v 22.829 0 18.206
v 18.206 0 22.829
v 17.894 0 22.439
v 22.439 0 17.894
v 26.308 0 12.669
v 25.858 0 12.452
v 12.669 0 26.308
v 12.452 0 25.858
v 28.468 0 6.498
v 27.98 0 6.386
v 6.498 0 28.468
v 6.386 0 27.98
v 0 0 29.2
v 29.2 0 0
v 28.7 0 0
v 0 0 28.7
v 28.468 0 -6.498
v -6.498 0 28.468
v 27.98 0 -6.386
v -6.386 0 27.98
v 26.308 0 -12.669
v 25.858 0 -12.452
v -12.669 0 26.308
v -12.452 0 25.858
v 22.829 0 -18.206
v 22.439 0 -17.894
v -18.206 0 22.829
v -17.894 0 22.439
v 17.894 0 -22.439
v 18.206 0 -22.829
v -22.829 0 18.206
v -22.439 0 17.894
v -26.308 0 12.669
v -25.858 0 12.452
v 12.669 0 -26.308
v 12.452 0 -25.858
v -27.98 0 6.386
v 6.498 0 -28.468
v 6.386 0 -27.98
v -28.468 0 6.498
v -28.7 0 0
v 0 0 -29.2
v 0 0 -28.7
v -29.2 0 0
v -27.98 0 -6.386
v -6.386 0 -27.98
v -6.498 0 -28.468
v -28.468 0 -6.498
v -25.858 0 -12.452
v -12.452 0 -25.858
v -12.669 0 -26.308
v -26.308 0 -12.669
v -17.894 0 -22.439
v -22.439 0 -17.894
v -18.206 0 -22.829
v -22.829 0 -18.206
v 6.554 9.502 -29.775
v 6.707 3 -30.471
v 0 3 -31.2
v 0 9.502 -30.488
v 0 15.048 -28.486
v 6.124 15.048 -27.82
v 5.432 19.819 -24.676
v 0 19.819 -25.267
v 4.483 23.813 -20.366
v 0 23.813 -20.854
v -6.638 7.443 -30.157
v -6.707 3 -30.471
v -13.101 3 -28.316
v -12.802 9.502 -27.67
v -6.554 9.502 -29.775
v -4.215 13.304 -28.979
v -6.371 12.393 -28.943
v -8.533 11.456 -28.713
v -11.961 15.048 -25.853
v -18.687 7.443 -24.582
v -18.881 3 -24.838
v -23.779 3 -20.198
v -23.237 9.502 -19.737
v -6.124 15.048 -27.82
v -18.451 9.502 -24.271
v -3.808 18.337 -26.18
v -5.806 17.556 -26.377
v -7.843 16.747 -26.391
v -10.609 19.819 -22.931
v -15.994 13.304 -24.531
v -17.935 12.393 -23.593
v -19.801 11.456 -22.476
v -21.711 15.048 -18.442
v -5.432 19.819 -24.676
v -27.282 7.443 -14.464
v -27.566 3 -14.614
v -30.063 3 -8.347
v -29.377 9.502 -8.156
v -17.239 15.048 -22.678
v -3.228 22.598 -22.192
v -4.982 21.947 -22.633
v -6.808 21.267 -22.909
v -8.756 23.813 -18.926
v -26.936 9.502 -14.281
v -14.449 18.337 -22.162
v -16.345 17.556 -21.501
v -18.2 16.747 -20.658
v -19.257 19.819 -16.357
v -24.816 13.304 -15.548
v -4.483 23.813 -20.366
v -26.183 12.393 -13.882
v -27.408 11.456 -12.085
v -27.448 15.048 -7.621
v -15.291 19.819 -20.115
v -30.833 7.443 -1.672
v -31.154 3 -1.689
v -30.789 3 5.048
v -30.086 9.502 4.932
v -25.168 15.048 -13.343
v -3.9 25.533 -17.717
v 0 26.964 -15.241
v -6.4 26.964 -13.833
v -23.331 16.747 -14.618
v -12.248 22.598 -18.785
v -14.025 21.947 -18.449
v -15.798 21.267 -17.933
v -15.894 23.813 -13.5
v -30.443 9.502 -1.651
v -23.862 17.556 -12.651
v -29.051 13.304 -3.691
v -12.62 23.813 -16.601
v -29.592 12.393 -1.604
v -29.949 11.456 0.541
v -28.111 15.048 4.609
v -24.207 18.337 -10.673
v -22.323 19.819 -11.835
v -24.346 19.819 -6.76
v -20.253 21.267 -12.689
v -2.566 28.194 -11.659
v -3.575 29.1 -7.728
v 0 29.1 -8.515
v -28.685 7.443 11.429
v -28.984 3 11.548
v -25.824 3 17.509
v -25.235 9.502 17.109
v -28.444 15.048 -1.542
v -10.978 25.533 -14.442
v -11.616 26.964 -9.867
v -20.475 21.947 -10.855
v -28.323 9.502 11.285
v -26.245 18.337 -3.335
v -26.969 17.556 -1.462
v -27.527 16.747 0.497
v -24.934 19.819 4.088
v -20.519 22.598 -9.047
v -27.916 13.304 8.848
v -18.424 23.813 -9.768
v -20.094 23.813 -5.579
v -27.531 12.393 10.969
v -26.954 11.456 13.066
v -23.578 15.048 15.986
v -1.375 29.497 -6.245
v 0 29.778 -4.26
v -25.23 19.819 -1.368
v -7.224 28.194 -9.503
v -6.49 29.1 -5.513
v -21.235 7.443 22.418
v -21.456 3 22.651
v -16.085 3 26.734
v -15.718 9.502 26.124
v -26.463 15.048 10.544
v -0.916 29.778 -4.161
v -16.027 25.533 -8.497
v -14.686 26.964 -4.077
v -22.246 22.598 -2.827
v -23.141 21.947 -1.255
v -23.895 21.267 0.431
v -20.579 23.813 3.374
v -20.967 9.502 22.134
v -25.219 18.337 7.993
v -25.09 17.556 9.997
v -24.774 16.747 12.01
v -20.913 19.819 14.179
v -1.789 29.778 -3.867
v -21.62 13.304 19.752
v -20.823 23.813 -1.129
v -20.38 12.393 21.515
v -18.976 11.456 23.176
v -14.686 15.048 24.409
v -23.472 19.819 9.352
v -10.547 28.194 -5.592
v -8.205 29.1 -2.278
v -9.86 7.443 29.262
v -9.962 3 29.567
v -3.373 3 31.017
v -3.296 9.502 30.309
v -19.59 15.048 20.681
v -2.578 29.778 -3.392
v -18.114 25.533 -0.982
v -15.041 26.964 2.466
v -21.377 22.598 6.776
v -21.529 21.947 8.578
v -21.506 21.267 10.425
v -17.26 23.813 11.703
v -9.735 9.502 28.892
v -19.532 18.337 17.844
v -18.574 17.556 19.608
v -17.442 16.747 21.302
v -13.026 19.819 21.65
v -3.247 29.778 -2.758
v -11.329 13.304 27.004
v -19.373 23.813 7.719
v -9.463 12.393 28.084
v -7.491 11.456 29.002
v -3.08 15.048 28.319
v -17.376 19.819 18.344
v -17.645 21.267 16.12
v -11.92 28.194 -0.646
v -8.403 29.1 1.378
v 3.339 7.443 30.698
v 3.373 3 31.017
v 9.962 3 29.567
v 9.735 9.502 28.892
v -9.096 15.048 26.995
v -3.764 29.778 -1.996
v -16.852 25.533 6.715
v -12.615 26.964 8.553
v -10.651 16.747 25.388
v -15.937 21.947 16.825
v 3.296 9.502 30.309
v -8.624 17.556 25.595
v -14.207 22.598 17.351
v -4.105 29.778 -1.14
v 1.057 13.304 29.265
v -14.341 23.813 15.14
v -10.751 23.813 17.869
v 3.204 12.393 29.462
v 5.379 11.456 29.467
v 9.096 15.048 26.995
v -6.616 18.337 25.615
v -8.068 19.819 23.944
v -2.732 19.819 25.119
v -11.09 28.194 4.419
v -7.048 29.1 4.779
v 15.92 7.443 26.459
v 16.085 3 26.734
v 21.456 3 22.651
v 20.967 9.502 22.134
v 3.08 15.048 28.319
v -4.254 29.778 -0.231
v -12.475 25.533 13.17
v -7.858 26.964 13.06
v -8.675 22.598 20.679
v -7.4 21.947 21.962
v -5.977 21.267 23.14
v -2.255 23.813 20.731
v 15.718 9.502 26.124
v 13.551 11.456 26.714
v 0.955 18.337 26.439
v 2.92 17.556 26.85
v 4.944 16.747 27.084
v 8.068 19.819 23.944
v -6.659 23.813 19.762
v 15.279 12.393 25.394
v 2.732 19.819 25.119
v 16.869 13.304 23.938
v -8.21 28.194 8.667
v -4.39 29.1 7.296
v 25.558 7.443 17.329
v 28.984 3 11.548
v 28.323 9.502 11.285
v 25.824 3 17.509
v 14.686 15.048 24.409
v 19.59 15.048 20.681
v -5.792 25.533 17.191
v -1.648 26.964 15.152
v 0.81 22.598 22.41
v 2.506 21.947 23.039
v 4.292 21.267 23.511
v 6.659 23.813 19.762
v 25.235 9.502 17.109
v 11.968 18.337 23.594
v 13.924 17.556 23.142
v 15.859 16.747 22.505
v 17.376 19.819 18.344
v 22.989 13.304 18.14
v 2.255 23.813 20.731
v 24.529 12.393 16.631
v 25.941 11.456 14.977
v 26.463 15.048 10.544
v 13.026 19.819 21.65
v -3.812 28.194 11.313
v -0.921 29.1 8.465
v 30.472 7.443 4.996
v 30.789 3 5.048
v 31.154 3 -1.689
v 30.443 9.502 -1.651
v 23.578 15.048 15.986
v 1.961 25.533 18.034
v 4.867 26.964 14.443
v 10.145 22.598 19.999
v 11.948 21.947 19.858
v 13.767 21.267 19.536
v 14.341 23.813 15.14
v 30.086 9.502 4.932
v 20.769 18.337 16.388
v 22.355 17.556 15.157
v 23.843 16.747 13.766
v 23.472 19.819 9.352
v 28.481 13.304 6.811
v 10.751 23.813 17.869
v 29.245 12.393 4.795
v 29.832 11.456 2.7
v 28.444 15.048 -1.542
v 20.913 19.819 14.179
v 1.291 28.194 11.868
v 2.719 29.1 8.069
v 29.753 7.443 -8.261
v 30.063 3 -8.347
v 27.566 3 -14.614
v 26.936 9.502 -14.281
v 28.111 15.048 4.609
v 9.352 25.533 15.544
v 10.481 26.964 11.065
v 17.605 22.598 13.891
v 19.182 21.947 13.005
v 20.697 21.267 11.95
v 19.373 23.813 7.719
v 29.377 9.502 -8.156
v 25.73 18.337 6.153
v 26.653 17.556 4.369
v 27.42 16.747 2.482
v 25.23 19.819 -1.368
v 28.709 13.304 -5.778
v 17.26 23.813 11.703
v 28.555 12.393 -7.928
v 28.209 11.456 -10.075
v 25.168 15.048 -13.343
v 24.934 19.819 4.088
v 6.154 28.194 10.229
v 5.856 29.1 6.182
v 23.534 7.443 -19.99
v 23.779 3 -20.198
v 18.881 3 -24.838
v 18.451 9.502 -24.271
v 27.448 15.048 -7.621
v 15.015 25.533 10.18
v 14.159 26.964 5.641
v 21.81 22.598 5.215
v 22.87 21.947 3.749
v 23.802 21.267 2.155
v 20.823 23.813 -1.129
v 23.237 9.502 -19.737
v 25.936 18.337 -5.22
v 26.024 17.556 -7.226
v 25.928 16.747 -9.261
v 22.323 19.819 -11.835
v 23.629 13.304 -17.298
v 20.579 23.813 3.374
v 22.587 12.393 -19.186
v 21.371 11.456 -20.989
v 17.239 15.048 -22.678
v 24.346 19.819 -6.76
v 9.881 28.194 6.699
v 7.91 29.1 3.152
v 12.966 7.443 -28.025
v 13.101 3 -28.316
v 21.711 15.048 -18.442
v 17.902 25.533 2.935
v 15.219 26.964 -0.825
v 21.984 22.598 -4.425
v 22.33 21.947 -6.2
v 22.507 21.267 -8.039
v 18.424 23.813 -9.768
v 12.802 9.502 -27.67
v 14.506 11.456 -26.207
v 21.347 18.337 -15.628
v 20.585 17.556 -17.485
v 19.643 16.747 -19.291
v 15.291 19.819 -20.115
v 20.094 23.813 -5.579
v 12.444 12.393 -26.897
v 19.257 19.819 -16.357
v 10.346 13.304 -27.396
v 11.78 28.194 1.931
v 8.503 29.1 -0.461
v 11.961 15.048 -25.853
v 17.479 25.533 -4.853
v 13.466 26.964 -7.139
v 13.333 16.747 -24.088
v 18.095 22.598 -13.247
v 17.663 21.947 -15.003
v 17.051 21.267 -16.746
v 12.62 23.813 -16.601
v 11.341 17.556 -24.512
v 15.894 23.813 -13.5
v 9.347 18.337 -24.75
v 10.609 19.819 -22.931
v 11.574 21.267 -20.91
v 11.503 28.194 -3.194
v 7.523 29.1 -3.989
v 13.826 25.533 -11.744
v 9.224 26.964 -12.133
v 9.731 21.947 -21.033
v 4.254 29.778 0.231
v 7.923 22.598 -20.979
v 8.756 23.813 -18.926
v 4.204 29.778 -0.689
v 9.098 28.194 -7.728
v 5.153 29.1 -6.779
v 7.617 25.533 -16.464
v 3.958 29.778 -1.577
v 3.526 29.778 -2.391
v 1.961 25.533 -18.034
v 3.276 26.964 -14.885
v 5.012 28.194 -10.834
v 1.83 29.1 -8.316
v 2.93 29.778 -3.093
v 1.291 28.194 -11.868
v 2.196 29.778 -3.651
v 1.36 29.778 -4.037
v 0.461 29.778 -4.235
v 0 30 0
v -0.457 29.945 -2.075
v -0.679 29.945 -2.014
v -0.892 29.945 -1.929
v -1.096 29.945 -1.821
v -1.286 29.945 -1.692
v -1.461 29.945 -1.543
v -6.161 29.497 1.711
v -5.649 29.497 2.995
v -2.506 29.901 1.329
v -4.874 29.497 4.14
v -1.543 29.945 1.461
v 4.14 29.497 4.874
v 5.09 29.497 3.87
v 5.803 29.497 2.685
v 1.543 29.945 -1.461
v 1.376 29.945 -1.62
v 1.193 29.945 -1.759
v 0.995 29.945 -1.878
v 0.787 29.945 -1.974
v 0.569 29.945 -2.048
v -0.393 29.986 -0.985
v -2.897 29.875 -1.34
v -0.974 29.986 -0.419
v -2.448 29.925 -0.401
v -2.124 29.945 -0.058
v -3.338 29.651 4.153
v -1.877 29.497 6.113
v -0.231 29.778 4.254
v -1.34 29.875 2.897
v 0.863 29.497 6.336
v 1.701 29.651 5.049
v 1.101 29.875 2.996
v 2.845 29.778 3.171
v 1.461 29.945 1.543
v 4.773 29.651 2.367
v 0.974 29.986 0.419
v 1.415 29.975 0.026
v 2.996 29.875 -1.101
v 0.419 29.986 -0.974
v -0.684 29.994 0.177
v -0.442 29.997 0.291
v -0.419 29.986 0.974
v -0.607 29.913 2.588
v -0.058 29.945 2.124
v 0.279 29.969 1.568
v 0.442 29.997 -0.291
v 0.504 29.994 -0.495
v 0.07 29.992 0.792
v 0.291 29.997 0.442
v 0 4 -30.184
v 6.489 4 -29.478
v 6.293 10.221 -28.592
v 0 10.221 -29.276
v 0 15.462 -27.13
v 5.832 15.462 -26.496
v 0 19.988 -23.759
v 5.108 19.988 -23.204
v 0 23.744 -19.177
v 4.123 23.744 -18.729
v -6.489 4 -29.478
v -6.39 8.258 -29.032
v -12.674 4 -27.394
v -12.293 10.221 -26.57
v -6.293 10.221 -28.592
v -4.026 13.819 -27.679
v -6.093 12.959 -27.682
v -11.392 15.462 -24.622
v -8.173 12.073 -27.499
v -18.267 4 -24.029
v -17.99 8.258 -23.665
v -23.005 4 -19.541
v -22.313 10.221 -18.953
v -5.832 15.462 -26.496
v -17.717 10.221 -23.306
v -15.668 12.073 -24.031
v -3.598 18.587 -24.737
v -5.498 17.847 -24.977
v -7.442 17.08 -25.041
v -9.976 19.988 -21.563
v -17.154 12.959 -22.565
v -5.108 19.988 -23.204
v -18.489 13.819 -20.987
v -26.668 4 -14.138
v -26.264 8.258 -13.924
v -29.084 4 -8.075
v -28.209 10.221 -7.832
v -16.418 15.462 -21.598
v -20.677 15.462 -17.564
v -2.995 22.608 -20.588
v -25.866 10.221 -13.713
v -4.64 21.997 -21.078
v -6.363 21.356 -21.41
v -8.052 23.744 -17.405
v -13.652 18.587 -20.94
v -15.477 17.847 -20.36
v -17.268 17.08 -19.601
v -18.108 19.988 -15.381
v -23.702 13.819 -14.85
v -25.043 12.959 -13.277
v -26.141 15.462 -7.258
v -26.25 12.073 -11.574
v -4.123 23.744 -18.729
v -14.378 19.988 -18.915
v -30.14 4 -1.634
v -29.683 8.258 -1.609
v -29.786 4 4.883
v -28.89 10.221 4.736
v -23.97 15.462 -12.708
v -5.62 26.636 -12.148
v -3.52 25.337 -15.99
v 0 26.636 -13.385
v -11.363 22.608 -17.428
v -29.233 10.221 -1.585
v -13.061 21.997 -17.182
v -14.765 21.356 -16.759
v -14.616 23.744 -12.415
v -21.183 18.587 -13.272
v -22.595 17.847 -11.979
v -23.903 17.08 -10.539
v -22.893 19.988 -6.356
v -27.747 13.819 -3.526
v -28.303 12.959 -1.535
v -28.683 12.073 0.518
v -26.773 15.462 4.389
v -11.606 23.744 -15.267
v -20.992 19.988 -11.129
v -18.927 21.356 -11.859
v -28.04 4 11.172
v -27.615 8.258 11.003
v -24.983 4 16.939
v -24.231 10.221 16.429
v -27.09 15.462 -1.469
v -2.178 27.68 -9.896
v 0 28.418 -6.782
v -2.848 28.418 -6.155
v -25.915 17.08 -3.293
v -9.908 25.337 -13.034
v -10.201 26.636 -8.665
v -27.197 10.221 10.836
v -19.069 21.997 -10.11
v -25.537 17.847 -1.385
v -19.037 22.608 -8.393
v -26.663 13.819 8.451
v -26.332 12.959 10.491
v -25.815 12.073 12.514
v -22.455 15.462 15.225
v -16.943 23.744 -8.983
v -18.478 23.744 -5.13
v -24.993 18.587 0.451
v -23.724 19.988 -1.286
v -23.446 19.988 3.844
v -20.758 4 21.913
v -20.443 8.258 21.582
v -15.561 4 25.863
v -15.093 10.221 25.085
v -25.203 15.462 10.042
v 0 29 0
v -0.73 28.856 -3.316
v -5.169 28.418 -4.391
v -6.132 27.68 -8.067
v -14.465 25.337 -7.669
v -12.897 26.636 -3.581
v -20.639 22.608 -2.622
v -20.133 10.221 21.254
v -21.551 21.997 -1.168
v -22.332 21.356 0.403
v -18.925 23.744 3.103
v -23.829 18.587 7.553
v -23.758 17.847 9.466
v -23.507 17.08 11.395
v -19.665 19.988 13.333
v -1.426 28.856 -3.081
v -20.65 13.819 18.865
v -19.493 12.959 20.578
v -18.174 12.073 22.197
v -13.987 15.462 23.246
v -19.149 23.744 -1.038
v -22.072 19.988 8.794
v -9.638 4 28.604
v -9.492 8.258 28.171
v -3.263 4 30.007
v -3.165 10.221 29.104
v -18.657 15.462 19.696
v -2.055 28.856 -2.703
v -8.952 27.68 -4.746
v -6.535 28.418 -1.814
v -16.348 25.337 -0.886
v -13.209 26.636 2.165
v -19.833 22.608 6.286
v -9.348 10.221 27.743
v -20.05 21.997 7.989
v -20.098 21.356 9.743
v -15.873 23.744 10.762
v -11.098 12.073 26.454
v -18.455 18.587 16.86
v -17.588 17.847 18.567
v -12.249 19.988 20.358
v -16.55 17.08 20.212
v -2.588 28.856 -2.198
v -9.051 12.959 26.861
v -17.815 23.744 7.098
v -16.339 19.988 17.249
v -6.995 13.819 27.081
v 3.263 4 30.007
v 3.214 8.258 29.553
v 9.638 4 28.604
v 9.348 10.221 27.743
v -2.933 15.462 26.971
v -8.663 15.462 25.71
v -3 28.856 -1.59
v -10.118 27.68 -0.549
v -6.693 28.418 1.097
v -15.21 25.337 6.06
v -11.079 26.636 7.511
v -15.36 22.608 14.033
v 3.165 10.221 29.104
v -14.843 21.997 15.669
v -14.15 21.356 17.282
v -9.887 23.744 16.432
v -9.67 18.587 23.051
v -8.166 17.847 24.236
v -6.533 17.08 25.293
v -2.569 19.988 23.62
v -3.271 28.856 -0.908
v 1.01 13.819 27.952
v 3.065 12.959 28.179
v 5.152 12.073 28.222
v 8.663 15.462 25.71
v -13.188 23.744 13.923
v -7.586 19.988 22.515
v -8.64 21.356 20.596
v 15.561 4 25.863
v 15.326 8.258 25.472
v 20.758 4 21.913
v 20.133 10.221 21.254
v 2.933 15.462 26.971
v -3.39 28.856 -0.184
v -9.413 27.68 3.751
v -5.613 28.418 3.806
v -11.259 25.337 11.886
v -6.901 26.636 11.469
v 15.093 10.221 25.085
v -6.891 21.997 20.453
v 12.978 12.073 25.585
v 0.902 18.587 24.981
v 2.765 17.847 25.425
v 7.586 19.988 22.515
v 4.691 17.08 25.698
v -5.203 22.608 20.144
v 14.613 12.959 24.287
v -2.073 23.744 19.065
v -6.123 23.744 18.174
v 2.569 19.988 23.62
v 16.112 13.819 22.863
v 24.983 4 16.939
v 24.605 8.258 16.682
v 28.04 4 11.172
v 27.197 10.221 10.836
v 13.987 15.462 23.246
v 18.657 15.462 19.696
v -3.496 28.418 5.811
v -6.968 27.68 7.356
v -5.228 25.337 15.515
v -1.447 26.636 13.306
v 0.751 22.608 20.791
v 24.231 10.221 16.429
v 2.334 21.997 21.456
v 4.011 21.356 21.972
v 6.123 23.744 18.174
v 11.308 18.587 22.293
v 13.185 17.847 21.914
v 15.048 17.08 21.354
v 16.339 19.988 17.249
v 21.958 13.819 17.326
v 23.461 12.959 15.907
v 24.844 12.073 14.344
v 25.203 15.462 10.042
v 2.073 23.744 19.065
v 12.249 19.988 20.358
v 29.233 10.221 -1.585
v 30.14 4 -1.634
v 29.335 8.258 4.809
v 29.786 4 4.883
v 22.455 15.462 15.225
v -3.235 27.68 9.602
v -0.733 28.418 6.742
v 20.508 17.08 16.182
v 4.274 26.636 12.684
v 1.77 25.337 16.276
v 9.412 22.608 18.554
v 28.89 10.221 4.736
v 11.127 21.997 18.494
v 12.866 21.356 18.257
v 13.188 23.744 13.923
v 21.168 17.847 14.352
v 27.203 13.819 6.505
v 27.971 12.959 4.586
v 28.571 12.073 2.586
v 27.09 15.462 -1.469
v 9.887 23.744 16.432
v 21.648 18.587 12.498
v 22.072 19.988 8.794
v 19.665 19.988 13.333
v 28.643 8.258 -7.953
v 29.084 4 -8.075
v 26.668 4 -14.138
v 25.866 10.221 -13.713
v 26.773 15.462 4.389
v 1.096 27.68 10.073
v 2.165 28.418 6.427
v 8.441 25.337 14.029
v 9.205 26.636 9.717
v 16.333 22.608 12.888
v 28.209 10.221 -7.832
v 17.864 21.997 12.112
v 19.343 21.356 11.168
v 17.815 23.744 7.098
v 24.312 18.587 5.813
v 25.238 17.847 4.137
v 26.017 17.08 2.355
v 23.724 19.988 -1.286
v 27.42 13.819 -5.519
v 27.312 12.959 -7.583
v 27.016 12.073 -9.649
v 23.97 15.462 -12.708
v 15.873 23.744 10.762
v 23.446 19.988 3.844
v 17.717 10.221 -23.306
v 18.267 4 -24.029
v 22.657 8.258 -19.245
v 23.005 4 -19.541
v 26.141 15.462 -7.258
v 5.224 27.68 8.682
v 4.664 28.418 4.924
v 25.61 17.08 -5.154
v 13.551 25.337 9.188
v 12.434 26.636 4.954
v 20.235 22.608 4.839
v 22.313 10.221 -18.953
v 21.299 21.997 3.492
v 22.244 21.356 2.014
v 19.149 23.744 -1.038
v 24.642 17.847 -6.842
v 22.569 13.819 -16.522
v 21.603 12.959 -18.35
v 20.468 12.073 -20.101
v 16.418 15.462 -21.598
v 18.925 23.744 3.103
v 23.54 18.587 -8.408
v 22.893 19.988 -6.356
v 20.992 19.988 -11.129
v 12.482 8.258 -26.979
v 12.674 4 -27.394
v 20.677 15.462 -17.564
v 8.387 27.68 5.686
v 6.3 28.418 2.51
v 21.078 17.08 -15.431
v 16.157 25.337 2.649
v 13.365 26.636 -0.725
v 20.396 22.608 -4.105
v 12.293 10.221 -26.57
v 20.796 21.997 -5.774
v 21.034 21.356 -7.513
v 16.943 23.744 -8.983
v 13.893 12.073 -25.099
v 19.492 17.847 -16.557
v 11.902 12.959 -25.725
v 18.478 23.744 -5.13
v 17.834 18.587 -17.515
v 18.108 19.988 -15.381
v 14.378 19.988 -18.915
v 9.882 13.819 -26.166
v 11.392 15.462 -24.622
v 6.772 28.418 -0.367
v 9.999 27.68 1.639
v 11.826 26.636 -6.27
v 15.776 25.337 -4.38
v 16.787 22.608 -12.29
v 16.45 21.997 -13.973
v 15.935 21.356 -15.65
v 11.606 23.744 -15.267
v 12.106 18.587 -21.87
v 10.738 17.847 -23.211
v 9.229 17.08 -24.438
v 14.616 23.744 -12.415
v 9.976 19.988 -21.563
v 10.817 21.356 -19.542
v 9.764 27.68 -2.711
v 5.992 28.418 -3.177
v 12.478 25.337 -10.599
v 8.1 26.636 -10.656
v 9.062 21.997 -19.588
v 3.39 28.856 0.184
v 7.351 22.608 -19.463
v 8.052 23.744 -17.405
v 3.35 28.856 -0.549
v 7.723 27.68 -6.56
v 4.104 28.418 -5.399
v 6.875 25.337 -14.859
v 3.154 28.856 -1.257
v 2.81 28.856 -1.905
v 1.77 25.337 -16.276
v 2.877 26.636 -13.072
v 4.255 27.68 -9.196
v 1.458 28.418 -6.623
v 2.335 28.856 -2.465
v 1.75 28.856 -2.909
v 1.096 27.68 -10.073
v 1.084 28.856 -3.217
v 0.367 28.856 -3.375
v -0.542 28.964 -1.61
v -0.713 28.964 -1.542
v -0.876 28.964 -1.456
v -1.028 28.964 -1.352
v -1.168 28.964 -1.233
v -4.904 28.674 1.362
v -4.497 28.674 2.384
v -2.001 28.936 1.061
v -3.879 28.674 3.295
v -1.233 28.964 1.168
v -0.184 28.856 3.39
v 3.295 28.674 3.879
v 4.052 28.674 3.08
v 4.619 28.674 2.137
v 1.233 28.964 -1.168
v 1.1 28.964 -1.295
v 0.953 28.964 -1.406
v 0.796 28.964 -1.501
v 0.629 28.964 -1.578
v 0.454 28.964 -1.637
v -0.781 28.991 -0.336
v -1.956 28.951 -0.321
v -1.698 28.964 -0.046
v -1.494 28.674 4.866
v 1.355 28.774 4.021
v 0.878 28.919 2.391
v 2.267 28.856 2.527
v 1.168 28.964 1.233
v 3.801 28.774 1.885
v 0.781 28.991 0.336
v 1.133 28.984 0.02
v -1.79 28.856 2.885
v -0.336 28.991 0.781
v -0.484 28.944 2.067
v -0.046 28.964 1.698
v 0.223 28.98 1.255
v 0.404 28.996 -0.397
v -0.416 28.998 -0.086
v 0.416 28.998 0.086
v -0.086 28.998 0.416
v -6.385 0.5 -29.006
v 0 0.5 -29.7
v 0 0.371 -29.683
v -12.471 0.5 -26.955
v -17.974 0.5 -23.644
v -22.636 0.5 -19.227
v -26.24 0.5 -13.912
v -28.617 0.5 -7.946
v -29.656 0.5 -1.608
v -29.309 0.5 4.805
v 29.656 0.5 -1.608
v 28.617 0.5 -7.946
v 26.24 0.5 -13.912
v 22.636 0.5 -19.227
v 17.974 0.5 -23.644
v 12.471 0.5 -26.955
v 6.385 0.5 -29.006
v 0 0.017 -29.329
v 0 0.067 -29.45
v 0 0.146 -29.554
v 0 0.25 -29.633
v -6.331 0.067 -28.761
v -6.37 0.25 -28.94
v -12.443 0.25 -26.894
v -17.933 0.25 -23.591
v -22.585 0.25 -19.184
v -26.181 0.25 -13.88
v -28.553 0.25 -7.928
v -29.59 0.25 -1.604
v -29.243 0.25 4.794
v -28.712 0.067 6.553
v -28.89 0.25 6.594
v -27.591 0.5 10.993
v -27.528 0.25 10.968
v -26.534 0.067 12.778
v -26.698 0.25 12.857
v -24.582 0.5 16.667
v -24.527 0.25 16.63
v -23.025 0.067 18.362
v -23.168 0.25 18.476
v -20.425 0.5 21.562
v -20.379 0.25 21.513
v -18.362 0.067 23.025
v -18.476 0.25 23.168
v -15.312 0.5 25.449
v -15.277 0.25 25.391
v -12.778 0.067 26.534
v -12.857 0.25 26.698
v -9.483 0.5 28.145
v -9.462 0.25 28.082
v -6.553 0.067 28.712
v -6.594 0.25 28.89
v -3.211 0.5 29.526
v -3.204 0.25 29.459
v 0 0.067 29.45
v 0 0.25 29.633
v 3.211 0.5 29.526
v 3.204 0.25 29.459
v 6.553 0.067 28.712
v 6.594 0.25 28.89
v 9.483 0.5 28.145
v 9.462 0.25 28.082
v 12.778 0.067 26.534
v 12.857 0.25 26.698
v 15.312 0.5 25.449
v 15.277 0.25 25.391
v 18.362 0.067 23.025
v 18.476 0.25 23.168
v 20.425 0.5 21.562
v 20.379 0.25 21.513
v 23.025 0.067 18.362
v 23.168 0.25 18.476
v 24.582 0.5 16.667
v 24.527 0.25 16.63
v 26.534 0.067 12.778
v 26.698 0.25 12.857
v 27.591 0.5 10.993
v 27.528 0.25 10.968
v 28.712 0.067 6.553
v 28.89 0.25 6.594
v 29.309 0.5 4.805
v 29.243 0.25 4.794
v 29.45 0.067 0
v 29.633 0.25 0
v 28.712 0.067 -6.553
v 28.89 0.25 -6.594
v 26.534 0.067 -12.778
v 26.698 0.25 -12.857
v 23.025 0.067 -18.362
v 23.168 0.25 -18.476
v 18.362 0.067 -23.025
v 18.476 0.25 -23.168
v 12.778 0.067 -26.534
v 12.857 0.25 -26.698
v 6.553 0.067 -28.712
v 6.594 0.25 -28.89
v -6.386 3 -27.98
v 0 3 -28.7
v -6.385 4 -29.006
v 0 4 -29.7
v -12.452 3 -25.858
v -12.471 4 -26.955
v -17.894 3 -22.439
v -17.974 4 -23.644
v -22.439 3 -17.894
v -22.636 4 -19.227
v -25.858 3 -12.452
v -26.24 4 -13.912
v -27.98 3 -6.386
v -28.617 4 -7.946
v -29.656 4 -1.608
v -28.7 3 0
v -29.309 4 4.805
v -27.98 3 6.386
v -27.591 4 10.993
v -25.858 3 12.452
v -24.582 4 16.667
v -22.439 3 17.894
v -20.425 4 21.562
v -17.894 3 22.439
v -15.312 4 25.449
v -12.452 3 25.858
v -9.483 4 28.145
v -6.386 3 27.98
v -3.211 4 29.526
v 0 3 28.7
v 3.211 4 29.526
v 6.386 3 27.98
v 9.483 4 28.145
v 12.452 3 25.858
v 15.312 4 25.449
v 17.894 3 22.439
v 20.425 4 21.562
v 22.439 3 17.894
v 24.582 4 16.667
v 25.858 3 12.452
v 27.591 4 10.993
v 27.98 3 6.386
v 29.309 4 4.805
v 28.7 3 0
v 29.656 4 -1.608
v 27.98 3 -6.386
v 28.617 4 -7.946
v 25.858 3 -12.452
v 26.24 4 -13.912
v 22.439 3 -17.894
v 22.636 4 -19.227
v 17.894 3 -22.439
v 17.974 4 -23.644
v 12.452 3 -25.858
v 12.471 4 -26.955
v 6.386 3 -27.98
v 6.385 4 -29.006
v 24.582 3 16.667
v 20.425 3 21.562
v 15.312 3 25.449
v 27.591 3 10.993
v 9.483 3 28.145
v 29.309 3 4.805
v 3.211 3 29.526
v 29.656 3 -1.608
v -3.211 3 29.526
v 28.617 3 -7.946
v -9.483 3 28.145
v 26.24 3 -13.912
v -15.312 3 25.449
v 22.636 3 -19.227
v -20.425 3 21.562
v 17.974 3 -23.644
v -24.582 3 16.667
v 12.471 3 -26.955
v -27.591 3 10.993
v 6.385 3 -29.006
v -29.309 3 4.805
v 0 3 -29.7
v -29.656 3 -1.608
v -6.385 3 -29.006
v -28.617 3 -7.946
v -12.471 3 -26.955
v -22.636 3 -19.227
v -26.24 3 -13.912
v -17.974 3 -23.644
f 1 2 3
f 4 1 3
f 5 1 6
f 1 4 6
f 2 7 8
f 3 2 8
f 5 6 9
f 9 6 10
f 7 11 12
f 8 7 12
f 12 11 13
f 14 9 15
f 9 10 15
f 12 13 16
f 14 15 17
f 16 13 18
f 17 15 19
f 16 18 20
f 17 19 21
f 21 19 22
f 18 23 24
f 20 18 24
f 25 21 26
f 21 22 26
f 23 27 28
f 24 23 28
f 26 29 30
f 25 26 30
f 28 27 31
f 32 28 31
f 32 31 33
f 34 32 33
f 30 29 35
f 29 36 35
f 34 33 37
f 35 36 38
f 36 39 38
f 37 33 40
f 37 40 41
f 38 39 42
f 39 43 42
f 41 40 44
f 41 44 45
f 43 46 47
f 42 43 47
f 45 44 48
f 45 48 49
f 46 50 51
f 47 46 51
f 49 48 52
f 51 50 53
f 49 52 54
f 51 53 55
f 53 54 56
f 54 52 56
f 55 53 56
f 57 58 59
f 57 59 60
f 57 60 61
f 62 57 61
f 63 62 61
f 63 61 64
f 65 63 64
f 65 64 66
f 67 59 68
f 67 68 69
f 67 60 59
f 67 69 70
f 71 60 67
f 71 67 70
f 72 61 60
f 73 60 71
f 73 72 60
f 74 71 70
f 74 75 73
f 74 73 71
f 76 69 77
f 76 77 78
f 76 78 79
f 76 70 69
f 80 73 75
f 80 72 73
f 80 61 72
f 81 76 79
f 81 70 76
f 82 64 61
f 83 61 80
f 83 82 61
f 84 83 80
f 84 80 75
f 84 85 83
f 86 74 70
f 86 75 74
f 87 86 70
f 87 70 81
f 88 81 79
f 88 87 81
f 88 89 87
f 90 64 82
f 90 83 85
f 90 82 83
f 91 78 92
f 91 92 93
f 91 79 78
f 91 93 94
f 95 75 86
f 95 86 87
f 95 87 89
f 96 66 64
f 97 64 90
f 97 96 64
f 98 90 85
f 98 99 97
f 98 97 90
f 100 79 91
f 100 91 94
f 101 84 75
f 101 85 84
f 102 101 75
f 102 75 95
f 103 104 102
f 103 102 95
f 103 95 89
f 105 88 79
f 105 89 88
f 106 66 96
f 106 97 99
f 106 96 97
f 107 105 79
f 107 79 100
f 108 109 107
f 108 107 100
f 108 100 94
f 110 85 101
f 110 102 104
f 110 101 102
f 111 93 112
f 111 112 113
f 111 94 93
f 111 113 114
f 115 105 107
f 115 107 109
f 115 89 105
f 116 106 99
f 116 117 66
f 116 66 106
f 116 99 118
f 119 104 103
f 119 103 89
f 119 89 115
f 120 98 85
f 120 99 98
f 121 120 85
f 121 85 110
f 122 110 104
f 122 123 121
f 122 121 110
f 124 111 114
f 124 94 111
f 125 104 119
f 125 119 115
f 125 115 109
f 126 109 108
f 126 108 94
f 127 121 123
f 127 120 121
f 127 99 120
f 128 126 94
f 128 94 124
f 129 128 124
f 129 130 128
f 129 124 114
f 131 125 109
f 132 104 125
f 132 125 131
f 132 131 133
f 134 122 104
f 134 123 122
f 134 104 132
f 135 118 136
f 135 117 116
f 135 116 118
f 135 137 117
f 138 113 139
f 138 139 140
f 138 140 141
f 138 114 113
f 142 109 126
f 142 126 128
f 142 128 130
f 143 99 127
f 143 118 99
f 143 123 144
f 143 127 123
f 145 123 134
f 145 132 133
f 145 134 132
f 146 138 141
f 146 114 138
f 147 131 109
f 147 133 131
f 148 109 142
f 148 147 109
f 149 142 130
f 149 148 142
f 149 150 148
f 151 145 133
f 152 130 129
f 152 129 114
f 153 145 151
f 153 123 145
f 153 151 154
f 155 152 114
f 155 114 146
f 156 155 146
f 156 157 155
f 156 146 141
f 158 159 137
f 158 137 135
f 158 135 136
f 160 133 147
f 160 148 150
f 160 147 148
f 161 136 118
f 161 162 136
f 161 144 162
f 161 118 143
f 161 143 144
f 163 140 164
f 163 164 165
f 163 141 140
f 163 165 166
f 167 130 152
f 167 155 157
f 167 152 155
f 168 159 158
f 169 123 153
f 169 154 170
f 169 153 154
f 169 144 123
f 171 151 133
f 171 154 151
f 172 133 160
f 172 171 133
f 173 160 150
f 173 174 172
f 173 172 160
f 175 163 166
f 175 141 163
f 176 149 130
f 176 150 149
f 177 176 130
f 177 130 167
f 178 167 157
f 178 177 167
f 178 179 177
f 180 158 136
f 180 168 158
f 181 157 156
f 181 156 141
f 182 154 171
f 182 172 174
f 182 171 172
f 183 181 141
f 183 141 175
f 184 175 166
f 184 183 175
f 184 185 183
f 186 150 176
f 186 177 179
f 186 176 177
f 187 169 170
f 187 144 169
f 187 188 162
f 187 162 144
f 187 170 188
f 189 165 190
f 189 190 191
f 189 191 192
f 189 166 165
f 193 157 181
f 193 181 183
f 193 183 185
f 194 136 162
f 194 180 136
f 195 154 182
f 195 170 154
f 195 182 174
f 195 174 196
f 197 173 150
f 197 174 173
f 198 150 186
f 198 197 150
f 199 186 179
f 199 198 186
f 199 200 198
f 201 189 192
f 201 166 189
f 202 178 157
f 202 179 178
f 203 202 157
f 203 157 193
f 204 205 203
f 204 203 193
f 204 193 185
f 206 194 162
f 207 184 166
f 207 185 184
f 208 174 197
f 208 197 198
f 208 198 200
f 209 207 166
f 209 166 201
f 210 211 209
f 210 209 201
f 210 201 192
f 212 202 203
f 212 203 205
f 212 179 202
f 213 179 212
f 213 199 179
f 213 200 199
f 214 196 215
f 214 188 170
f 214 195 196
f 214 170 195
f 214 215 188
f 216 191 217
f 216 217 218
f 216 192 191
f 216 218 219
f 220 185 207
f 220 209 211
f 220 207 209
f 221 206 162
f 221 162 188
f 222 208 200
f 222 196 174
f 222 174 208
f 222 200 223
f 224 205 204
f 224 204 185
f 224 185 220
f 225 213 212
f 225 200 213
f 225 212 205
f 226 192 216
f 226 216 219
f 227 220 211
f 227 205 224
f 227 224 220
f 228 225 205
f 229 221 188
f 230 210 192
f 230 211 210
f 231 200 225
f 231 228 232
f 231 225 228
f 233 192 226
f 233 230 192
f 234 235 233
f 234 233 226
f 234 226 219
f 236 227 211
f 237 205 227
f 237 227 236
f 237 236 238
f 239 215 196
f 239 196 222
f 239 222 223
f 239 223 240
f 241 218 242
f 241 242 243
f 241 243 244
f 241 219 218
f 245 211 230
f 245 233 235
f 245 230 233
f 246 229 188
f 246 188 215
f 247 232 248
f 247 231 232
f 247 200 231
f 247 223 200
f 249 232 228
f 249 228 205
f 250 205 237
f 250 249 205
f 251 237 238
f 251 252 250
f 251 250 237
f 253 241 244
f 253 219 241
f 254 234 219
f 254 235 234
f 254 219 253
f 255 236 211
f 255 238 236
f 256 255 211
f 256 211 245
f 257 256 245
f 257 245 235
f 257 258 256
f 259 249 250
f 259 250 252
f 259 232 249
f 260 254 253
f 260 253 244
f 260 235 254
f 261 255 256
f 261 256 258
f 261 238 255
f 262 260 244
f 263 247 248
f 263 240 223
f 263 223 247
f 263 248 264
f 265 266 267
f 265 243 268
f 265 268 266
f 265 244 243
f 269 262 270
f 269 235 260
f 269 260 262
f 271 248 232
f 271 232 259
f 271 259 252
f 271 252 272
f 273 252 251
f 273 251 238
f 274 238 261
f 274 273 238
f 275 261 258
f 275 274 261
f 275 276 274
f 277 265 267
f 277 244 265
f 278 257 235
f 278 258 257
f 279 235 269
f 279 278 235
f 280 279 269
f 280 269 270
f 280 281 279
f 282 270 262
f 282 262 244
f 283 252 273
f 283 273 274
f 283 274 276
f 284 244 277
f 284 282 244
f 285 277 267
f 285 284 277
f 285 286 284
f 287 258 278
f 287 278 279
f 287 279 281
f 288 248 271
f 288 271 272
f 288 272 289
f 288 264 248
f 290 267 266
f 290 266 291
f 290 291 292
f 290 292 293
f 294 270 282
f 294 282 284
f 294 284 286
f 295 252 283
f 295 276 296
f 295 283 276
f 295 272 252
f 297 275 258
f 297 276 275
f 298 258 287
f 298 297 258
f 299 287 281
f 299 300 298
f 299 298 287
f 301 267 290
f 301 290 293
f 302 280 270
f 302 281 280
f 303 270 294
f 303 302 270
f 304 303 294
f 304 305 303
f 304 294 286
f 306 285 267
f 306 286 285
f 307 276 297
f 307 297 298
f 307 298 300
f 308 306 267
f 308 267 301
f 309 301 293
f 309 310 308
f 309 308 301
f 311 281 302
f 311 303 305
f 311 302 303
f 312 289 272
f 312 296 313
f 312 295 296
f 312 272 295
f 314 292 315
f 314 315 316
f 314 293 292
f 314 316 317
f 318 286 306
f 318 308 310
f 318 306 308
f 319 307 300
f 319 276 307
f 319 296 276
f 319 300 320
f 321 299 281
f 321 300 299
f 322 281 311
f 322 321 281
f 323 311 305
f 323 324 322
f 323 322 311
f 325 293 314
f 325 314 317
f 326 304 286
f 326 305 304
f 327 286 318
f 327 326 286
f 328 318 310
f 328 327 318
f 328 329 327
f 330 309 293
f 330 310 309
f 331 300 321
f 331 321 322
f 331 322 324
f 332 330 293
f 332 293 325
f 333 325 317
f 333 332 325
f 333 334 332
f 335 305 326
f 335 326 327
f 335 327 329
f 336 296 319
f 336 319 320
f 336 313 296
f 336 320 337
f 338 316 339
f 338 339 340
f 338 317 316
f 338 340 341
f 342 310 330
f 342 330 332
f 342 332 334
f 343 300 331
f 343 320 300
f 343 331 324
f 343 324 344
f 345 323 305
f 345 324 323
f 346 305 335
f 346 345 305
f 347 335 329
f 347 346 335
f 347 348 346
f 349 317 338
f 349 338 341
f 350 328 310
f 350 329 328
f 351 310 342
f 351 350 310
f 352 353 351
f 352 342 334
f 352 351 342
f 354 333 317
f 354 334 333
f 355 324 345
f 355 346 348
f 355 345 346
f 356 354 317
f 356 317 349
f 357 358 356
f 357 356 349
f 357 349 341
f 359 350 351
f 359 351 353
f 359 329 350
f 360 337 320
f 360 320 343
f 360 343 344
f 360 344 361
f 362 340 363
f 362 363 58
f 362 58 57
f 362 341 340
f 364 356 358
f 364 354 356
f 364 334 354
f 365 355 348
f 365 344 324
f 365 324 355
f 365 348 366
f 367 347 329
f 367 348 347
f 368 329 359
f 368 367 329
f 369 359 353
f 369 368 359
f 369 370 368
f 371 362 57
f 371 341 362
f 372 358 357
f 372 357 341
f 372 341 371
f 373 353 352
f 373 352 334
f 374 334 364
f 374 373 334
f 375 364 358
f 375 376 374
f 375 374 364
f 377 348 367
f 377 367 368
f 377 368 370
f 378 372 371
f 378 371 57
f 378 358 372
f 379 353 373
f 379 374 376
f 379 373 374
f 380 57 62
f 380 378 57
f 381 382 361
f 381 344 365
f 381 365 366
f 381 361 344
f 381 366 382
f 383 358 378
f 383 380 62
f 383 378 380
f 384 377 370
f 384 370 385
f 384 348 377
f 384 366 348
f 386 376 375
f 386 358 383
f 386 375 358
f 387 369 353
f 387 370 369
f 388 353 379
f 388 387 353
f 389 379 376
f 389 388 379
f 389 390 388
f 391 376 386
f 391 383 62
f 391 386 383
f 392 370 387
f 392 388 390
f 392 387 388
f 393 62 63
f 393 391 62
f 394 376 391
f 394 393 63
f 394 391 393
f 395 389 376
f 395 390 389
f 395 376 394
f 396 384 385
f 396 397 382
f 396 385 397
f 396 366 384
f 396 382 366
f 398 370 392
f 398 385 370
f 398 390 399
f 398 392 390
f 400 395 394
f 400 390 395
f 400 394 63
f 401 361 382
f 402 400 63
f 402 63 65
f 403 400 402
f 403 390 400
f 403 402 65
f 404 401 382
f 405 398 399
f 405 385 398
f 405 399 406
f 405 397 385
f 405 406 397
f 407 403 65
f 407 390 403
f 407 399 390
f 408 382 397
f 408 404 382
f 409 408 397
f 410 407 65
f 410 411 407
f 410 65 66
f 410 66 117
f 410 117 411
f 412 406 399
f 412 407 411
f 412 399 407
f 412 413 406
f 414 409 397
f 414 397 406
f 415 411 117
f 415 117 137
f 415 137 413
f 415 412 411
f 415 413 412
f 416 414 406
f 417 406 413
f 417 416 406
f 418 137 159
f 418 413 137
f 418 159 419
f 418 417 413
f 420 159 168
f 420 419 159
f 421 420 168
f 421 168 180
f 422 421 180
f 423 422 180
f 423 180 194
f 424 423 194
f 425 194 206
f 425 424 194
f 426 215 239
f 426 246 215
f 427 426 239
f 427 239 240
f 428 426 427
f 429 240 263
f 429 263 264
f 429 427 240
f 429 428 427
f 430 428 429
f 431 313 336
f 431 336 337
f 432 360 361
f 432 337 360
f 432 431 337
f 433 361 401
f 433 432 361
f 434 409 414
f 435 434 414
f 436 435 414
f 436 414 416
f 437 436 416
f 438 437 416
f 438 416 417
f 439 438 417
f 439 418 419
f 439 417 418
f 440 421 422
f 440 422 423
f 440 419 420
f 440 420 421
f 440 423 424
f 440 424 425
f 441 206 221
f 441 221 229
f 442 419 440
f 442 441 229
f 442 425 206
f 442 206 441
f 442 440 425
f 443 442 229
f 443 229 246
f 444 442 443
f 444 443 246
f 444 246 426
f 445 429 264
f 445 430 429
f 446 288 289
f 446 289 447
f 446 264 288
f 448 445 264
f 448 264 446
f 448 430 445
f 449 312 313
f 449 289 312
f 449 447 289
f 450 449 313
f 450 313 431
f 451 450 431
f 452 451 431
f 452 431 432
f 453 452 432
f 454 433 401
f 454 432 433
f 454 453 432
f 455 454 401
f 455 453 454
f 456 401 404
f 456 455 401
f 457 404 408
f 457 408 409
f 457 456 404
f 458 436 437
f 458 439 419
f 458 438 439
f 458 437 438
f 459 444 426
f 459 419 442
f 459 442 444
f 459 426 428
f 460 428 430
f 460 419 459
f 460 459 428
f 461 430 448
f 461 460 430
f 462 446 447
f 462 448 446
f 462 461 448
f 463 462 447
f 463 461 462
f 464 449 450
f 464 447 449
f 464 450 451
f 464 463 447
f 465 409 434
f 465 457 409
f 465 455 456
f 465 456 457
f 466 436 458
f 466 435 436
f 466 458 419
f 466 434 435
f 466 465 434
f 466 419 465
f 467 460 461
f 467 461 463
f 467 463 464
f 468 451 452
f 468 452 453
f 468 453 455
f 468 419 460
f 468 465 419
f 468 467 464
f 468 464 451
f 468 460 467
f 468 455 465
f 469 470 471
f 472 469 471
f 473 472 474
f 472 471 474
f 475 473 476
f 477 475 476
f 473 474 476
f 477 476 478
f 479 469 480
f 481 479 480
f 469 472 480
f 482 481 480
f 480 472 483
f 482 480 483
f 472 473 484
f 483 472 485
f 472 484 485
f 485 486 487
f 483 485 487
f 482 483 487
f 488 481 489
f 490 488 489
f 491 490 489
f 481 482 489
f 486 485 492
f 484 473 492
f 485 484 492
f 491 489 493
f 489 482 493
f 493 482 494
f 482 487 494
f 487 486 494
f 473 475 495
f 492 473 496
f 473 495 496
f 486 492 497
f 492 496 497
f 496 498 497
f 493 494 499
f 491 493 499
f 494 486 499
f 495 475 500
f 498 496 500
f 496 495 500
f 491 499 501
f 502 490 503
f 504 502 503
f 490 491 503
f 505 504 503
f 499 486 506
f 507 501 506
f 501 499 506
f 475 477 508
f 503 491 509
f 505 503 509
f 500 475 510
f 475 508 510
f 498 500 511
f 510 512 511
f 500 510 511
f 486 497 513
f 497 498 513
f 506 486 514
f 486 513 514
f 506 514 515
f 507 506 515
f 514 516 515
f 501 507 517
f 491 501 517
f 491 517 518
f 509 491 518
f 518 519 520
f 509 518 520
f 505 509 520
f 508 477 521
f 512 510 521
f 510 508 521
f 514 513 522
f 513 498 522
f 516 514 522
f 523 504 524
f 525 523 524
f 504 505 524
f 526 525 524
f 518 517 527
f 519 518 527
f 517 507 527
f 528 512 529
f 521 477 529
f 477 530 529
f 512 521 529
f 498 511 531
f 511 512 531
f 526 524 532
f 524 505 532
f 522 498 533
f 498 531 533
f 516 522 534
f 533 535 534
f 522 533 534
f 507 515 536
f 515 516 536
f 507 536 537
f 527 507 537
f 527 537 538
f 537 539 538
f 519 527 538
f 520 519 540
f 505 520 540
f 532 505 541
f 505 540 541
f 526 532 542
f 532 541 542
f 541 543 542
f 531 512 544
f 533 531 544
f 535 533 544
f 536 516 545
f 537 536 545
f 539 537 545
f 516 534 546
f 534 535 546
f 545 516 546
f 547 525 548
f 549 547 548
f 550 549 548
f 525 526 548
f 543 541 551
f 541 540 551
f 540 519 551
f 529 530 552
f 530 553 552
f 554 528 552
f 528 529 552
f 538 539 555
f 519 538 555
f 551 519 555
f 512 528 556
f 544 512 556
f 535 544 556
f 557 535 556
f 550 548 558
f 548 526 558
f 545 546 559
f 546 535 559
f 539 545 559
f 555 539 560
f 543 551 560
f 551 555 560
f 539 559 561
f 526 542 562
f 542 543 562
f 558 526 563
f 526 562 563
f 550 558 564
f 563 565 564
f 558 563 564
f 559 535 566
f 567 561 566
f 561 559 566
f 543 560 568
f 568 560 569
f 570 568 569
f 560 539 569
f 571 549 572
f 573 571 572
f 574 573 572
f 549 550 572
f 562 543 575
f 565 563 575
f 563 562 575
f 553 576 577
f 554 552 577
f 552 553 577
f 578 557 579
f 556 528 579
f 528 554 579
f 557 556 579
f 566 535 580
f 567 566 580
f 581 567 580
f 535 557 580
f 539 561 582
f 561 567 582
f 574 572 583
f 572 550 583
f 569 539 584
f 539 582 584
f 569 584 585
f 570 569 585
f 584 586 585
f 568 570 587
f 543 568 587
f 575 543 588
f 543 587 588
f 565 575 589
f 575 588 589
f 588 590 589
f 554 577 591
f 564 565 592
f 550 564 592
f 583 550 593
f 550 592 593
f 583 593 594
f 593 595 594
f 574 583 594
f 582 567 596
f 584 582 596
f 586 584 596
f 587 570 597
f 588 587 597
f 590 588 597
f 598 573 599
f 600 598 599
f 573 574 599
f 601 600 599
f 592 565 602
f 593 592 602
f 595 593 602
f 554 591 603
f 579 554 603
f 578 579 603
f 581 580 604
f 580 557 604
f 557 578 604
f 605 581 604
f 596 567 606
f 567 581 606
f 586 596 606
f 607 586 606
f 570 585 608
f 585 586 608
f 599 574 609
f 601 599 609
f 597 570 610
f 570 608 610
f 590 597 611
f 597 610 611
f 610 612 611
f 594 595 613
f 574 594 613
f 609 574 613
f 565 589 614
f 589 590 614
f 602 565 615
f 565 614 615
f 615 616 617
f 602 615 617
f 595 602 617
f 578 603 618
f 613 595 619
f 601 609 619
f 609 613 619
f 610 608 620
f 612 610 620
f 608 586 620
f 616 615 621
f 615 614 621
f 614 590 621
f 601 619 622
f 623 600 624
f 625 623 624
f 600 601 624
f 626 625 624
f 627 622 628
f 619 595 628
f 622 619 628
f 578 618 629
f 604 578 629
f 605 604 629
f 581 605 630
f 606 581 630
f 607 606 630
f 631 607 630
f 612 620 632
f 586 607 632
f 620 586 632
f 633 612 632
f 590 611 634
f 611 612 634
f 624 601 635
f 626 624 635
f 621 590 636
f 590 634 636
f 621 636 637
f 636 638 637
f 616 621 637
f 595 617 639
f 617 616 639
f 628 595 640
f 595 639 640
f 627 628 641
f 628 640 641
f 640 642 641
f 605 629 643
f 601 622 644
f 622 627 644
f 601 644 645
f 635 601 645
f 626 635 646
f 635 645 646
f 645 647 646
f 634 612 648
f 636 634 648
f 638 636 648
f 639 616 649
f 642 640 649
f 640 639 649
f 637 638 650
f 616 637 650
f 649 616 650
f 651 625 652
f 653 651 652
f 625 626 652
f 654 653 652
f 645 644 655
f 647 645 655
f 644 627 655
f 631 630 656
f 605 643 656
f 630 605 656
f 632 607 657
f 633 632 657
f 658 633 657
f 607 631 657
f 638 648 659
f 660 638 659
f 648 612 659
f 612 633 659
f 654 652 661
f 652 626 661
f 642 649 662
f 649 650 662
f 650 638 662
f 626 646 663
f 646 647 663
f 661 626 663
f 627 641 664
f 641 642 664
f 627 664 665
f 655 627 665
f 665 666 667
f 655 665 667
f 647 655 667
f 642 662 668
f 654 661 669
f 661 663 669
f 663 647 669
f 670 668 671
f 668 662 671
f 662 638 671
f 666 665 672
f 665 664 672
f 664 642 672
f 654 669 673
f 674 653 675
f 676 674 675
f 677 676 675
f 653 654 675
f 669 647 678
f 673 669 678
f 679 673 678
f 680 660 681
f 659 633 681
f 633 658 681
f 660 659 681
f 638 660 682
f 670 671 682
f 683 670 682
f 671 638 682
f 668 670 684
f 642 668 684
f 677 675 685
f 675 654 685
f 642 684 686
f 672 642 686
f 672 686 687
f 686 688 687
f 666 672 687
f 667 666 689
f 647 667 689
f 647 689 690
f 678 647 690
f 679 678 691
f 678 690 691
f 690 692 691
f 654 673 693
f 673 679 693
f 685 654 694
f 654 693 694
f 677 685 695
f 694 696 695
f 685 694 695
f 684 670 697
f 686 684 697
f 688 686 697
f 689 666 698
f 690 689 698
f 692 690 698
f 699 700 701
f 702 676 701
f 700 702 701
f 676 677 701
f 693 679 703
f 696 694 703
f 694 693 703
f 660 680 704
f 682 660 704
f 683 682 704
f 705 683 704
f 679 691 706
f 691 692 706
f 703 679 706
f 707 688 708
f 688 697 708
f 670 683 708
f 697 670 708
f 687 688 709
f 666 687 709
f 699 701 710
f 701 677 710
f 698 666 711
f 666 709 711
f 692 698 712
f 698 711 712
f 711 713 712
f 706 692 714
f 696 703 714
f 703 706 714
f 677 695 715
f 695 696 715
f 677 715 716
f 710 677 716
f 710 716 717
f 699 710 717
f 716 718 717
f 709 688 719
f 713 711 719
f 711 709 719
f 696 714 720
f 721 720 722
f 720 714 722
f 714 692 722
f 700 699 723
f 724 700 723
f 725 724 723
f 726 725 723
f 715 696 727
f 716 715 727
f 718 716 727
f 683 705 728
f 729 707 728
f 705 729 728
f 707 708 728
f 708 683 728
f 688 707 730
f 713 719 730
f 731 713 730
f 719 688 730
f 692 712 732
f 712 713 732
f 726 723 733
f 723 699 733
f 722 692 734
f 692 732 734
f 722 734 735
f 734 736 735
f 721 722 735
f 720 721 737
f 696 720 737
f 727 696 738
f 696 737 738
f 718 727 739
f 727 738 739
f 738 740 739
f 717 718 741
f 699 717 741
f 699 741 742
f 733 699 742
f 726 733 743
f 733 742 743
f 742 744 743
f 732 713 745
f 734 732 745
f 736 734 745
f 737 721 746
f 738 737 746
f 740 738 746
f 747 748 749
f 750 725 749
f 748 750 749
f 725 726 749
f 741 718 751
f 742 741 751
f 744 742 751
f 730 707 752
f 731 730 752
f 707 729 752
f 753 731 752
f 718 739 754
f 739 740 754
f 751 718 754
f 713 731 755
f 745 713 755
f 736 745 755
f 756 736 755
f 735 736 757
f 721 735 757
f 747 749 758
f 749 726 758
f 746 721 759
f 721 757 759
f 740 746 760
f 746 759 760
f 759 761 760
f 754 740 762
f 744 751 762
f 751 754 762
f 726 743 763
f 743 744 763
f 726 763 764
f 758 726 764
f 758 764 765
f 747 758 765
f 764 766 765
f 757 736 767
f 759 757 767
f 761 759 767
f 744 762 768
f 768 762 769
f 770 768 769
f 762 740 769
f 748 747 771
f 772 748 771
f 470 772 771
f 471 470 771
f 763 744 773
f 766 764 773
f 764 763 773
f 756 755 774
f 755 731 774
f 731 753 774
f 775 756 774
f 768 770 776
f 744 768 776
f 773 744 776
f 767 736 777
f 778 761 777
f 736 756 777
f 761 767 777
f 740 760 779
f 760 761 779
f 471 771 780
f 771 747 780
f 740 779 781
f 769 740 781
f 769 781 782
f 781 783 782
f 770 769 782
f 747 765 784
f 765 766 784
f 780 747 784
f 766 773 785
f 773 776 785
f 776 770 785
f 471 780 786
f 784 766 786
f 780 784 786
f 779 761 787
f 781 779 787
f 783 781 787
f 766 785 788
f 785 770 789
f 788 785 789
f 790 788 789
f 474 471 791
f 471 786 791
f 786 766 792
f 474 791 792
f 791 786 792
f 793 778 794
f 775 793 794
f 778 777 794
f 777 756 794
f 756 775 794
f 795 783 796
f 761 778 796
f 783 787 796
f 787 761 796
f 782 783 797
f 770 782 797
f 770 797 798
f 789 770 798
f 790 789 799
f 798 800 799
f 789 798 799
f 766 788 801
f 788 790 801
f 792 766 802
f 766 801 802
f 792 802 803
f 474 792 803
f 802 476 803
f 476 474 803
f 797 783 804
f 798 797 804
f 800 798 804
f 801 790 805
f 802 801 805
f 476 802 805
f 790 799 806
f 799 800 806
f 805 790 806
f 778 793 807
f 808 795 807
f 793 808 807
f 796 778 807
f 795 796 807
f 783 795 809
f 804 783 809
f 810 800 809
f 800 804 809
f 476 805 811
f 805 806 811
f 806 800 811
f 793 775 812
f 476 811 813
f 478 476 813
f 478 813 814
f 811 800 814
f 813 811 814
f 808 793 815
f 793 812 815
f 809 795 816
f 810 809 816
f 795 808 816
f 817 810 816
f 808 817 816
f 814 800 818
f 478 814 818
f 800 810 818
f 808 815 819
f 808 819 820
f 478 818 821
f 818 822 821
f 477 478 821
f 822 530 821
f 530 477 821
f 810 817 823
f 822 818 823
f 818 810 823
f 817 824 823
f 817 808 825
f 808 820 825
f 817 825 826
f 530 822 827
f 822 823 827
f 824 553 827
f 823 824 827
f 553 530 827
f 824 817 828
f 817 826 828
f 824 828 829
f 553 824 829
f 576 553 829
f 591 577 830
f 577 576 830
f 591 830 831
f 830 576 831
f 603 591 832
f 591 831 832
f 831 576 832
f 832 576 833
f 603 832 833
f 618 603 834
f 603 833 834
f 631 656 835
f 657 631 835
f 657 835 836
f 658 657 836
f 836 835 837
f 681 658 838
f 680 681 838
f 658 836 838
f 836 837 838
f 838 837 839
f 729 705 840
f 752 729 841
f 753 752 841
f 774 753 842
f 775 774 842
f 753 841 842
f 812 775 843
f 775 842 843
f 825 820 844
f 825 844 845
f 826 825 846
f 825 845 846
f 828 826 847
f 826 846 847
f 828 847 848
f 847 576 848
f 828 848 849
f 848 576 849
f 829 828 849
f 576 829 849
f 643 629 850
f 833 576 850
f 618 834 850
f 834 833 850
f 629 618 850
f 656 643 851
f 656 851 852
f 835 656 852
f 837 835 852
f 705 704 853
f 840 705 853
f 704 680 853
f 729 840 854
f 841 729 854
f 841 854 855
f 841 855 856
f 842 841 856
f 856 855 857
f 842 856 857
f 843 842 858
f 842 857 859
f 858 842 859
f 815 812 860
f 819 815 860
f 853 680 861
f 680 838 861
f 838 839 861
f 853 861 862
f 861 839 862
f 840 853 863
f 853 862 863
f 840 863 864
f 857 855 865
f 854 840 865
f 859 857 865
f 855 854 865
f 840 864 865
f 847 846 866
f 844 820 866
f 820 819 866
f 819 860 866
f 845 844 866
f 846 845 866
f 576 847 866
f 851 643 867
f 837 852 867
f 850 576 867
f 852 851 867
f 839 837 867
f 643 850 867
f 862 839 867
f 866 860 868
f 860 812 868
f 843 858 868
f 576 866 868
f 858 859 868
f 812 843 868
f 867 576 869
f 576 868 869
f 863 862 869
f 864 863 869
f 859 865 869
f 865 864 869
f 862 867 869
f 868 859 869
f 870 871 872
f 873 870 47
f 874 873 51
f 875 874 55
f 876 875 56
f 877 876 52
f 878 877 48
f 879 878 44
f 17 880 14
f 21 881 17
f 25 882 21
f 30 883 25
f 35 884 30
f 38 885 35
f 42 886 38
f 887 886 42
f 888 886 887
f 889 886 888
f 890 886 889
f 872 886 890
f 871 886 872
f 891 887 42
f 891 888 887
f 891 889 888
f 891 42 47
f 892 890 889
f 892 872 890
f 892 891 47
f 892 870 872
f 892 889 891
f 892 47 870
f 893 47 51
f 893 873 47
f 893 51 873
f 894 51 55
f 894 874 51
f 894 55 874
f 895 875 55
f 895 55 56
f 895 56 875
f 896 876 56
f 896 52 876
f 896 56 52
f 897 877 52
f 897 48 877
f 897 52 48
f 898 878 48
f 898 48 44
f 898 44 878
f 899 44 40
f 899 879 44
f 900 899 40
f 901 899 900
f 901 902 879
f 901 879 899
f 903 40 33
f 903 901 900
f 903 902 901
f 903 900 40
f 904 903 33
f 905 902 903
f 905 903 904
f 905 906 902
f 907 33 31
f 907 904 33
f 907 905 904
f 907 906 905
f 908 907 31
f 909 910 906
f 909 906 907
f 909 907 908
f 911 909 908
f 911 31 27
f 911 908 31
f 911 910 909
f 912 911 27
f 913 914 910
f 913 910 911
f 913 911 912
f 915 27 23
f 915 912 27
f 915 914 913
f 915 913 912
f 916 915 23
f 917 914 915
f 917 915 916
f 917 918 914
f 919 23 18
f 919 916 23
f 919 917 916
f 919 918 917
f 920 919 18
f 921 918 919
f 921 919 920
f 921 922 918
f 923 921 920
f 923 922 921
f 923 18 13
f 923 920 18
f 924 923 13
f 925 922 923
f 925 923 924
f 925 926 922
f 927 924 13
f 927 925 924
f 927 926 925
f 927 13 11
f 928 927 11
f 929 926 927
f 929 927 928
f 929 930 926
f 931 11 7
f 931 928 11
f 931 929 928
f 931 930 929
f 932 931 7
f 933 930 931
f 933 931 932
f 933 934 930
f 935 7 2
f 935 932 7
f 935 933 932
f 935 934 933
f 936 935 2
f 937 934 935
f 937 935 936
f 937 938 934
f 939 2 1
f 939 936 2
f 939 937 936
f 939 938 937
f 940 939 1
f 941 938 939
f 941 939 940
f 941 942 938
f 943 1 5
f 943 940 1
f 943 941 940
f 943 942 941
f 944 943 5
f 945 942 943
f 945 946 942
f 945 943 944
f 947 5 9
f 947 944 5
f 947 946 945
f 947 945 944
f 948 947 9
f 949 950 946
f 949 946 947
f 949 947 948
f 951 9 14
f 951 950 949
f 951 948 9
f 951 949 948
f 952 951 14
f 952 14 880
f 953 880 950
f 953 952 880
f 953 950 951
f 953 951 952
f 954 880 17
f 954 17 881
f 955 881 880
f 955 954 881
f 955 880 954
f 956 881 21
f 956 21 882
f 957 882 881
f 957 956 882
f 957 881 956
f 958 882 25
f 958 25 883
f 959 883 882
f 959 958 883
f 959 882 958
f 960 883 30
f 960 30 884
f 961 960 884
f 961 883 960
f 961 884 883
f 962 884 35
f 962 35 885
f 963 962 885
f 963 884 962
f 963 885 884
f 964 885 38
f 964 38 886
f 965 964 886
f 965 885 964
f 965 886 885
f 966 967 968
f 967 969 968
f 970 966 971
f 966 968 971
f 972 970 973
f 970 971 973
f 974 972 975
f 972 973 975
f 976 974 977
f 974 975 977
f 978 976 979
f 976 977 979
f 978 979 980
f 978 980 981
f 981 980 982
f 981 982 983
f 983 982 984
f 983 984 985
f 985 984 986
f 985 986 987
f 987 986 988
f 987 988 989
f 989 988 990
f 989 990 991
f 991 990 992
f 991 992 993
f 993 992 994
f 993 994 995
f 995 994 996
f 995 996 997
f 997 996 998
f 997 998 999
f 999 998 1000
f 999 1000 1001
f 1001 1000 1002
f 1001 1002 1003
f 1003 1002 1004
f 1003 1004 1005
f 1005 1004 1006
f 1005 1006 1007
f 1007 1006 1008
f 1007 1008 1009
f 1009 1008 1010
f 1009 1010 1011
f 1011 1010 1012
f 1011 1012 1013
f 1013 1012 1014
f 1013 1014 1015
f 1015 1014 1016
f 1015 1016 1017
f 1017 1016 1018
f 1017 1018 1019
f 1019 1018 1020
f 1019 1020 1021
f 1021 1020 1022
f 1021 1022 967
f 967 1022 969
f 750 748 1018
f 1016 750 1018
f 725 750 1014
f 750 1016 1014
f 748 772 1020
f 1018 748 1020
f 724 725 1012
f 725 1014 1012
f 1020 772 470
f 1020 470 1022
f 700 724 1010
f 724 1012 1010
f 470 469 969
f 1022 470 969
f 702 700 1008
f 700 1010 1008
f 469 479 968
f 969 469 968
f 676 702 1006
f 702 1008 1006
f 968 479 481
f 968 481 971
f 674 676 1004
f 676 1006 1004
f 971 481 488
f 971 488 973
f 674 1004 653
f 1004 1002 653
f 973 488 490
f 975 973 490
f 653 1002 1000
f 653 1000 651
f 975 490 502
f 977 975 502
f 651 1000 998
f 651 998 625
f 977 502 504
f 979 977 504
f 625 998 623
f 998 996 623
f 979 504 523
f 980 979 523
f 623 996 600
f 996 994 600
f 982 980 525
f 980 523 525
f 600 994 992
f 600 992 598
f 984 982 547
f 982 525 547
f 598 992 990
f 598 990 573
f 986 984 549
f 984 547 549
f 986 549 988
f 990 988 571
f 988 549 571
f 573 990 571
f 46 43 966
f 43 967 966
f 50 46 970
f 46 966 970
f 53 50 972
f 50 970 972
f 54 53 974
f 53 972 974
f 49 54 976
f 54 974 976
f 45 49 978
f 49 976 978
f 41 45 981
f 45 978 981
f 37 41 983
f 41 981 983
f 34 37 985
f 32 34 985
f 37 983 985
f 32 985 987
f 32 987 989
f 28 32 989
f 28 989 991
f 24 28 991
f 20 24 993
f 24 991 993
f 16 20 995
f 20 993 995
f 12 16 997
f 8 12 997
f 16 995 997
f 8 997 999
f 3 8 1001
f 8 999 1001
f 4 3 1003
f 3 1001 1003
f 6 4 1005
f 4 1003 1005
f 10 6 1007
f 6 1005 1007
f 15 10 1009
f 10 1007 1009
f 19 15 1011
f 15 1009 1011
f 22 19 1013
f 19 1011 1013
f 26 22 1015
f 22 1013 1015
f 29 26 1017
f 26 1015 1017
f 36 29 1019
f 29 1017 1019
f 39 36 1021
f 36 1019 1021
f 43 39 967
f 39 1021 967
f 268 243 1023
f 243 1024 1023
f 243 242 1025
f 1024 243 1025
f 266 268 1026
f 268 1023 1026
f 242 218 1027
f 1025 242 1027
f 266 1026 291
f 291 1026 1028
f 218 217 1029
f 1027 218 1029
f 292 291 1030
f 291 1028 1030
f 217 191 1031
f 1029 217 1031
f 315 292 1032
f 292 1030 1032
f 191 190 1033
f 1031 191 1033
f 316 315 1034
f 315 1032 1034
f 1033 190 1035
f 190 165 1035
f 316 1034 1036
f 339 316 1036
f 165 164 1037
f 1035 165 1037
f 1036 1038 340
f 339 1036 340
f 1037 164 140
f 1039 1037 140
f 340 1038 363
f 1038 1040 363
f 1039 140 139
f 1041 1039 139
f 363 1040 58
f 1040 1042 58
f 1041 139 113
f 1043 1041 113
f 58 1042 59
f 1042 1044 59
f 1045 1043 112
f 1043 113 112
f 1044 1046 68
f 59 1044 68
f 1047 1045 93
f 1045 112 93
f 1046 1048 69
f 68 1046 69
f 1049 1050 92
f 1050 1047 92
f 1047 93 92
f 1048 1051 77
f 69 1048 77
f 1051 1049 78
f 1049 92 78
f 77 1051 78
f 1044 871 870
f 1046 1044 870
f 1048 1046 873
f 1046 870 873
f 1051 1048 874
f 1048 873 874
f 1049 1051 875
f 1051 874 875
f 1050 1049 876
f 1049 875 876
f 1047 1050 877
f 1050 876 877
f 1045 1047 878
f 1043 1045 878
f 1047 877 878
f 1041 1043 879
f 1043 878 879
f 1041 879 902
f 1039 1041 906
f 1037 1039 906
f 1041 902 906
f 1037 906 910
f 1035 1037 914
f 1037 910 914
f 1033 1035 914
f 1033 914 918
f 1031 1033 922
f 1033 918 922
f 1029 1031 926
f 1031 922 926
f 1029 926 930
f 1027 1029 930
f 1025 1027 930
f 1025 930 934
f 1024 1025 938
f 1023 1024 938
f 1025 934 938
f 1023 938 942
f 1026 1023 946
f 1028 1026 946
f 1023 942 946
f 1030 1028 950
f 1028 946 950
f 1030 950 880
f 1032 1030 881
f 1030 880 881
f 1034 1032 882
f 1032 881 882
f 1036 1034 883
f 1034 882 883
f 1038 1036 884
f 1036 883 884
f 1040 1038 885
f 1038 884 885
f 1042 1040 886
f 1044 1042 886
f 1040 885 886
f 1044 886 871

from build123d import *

# Parameters (mm, degrees)
FILLET1_R = 0.5


with BuildPart() as part:
    # Sketch2 → Revolve1 (revolve)
    with BuildSketch(Plane.XY, mode=Mode.PRIVATE) as revolve1_sk:
        with BuildLine():
            Line((-29.7, 0), (-28.7, 0))
            Line((-28.7, 0), (-28.7, 3))
            Line((-28.7, 3), (-29.7, 4))
            Line((-29.7, 4), (-30.184026904, 4))
            add(Edge.make_bspline(
                [(-30.184026904, 4), (-30.166623492, 4.54069605), (-30.101486192, 5.634791729), (-29.85987076, 7.705122509), (-29.354955902, 10.152548026), (-28.451009727, 12.848310996), (-26.880303632, 16.14102408), (-24.288807456, 19.707939202), (-20.346681081, 23.158657086), (-15.748479669, 25.805349854), (-10.689451806, 27.666671311), (-5.353447893, 28.762877066), (-1.787836999, 29), (0, 29)],
                knots=[0.018366947, 0.018366947, 0.018366947, 0.018366947, 0.04904298, 0.079719013, 0.141071079, 0.202423145, 0.263775211, 0.386479342, 0.509183474, 0.631887605, 0.754591737, 0.877295868, 1, 1, 1, 1], degree=3))
            Line((0, 29), (0, 30))
            add(Edge.make_bspline(
                [(-31.2, 3), (-31.2, 21.931598134), (-14.795104957, 30), (0, 30)],
                knots=[0, 0, 0, 0, 1, 1, 1, 1], degree=3))
            Line((-31.2, 3), (-29.7, 3))
            Line((-29.7, 3), (-29.7, 0))
        make_face()
    revolve(revolve1_sk.sketch.rotate(Axis((0, 0, 0), (0, 1, 0)), 270), axis=Axis((0, 0, 0), (0, 1, 0)))

    # Fillet1
    fillet1_edges = [part.edges().sort_by_distance(p)[0] for p in [
        (0, 0, 29.7),
    ]]
    fillet(fillet1_edges, radius=FILLET1_R)


solid = part.part
